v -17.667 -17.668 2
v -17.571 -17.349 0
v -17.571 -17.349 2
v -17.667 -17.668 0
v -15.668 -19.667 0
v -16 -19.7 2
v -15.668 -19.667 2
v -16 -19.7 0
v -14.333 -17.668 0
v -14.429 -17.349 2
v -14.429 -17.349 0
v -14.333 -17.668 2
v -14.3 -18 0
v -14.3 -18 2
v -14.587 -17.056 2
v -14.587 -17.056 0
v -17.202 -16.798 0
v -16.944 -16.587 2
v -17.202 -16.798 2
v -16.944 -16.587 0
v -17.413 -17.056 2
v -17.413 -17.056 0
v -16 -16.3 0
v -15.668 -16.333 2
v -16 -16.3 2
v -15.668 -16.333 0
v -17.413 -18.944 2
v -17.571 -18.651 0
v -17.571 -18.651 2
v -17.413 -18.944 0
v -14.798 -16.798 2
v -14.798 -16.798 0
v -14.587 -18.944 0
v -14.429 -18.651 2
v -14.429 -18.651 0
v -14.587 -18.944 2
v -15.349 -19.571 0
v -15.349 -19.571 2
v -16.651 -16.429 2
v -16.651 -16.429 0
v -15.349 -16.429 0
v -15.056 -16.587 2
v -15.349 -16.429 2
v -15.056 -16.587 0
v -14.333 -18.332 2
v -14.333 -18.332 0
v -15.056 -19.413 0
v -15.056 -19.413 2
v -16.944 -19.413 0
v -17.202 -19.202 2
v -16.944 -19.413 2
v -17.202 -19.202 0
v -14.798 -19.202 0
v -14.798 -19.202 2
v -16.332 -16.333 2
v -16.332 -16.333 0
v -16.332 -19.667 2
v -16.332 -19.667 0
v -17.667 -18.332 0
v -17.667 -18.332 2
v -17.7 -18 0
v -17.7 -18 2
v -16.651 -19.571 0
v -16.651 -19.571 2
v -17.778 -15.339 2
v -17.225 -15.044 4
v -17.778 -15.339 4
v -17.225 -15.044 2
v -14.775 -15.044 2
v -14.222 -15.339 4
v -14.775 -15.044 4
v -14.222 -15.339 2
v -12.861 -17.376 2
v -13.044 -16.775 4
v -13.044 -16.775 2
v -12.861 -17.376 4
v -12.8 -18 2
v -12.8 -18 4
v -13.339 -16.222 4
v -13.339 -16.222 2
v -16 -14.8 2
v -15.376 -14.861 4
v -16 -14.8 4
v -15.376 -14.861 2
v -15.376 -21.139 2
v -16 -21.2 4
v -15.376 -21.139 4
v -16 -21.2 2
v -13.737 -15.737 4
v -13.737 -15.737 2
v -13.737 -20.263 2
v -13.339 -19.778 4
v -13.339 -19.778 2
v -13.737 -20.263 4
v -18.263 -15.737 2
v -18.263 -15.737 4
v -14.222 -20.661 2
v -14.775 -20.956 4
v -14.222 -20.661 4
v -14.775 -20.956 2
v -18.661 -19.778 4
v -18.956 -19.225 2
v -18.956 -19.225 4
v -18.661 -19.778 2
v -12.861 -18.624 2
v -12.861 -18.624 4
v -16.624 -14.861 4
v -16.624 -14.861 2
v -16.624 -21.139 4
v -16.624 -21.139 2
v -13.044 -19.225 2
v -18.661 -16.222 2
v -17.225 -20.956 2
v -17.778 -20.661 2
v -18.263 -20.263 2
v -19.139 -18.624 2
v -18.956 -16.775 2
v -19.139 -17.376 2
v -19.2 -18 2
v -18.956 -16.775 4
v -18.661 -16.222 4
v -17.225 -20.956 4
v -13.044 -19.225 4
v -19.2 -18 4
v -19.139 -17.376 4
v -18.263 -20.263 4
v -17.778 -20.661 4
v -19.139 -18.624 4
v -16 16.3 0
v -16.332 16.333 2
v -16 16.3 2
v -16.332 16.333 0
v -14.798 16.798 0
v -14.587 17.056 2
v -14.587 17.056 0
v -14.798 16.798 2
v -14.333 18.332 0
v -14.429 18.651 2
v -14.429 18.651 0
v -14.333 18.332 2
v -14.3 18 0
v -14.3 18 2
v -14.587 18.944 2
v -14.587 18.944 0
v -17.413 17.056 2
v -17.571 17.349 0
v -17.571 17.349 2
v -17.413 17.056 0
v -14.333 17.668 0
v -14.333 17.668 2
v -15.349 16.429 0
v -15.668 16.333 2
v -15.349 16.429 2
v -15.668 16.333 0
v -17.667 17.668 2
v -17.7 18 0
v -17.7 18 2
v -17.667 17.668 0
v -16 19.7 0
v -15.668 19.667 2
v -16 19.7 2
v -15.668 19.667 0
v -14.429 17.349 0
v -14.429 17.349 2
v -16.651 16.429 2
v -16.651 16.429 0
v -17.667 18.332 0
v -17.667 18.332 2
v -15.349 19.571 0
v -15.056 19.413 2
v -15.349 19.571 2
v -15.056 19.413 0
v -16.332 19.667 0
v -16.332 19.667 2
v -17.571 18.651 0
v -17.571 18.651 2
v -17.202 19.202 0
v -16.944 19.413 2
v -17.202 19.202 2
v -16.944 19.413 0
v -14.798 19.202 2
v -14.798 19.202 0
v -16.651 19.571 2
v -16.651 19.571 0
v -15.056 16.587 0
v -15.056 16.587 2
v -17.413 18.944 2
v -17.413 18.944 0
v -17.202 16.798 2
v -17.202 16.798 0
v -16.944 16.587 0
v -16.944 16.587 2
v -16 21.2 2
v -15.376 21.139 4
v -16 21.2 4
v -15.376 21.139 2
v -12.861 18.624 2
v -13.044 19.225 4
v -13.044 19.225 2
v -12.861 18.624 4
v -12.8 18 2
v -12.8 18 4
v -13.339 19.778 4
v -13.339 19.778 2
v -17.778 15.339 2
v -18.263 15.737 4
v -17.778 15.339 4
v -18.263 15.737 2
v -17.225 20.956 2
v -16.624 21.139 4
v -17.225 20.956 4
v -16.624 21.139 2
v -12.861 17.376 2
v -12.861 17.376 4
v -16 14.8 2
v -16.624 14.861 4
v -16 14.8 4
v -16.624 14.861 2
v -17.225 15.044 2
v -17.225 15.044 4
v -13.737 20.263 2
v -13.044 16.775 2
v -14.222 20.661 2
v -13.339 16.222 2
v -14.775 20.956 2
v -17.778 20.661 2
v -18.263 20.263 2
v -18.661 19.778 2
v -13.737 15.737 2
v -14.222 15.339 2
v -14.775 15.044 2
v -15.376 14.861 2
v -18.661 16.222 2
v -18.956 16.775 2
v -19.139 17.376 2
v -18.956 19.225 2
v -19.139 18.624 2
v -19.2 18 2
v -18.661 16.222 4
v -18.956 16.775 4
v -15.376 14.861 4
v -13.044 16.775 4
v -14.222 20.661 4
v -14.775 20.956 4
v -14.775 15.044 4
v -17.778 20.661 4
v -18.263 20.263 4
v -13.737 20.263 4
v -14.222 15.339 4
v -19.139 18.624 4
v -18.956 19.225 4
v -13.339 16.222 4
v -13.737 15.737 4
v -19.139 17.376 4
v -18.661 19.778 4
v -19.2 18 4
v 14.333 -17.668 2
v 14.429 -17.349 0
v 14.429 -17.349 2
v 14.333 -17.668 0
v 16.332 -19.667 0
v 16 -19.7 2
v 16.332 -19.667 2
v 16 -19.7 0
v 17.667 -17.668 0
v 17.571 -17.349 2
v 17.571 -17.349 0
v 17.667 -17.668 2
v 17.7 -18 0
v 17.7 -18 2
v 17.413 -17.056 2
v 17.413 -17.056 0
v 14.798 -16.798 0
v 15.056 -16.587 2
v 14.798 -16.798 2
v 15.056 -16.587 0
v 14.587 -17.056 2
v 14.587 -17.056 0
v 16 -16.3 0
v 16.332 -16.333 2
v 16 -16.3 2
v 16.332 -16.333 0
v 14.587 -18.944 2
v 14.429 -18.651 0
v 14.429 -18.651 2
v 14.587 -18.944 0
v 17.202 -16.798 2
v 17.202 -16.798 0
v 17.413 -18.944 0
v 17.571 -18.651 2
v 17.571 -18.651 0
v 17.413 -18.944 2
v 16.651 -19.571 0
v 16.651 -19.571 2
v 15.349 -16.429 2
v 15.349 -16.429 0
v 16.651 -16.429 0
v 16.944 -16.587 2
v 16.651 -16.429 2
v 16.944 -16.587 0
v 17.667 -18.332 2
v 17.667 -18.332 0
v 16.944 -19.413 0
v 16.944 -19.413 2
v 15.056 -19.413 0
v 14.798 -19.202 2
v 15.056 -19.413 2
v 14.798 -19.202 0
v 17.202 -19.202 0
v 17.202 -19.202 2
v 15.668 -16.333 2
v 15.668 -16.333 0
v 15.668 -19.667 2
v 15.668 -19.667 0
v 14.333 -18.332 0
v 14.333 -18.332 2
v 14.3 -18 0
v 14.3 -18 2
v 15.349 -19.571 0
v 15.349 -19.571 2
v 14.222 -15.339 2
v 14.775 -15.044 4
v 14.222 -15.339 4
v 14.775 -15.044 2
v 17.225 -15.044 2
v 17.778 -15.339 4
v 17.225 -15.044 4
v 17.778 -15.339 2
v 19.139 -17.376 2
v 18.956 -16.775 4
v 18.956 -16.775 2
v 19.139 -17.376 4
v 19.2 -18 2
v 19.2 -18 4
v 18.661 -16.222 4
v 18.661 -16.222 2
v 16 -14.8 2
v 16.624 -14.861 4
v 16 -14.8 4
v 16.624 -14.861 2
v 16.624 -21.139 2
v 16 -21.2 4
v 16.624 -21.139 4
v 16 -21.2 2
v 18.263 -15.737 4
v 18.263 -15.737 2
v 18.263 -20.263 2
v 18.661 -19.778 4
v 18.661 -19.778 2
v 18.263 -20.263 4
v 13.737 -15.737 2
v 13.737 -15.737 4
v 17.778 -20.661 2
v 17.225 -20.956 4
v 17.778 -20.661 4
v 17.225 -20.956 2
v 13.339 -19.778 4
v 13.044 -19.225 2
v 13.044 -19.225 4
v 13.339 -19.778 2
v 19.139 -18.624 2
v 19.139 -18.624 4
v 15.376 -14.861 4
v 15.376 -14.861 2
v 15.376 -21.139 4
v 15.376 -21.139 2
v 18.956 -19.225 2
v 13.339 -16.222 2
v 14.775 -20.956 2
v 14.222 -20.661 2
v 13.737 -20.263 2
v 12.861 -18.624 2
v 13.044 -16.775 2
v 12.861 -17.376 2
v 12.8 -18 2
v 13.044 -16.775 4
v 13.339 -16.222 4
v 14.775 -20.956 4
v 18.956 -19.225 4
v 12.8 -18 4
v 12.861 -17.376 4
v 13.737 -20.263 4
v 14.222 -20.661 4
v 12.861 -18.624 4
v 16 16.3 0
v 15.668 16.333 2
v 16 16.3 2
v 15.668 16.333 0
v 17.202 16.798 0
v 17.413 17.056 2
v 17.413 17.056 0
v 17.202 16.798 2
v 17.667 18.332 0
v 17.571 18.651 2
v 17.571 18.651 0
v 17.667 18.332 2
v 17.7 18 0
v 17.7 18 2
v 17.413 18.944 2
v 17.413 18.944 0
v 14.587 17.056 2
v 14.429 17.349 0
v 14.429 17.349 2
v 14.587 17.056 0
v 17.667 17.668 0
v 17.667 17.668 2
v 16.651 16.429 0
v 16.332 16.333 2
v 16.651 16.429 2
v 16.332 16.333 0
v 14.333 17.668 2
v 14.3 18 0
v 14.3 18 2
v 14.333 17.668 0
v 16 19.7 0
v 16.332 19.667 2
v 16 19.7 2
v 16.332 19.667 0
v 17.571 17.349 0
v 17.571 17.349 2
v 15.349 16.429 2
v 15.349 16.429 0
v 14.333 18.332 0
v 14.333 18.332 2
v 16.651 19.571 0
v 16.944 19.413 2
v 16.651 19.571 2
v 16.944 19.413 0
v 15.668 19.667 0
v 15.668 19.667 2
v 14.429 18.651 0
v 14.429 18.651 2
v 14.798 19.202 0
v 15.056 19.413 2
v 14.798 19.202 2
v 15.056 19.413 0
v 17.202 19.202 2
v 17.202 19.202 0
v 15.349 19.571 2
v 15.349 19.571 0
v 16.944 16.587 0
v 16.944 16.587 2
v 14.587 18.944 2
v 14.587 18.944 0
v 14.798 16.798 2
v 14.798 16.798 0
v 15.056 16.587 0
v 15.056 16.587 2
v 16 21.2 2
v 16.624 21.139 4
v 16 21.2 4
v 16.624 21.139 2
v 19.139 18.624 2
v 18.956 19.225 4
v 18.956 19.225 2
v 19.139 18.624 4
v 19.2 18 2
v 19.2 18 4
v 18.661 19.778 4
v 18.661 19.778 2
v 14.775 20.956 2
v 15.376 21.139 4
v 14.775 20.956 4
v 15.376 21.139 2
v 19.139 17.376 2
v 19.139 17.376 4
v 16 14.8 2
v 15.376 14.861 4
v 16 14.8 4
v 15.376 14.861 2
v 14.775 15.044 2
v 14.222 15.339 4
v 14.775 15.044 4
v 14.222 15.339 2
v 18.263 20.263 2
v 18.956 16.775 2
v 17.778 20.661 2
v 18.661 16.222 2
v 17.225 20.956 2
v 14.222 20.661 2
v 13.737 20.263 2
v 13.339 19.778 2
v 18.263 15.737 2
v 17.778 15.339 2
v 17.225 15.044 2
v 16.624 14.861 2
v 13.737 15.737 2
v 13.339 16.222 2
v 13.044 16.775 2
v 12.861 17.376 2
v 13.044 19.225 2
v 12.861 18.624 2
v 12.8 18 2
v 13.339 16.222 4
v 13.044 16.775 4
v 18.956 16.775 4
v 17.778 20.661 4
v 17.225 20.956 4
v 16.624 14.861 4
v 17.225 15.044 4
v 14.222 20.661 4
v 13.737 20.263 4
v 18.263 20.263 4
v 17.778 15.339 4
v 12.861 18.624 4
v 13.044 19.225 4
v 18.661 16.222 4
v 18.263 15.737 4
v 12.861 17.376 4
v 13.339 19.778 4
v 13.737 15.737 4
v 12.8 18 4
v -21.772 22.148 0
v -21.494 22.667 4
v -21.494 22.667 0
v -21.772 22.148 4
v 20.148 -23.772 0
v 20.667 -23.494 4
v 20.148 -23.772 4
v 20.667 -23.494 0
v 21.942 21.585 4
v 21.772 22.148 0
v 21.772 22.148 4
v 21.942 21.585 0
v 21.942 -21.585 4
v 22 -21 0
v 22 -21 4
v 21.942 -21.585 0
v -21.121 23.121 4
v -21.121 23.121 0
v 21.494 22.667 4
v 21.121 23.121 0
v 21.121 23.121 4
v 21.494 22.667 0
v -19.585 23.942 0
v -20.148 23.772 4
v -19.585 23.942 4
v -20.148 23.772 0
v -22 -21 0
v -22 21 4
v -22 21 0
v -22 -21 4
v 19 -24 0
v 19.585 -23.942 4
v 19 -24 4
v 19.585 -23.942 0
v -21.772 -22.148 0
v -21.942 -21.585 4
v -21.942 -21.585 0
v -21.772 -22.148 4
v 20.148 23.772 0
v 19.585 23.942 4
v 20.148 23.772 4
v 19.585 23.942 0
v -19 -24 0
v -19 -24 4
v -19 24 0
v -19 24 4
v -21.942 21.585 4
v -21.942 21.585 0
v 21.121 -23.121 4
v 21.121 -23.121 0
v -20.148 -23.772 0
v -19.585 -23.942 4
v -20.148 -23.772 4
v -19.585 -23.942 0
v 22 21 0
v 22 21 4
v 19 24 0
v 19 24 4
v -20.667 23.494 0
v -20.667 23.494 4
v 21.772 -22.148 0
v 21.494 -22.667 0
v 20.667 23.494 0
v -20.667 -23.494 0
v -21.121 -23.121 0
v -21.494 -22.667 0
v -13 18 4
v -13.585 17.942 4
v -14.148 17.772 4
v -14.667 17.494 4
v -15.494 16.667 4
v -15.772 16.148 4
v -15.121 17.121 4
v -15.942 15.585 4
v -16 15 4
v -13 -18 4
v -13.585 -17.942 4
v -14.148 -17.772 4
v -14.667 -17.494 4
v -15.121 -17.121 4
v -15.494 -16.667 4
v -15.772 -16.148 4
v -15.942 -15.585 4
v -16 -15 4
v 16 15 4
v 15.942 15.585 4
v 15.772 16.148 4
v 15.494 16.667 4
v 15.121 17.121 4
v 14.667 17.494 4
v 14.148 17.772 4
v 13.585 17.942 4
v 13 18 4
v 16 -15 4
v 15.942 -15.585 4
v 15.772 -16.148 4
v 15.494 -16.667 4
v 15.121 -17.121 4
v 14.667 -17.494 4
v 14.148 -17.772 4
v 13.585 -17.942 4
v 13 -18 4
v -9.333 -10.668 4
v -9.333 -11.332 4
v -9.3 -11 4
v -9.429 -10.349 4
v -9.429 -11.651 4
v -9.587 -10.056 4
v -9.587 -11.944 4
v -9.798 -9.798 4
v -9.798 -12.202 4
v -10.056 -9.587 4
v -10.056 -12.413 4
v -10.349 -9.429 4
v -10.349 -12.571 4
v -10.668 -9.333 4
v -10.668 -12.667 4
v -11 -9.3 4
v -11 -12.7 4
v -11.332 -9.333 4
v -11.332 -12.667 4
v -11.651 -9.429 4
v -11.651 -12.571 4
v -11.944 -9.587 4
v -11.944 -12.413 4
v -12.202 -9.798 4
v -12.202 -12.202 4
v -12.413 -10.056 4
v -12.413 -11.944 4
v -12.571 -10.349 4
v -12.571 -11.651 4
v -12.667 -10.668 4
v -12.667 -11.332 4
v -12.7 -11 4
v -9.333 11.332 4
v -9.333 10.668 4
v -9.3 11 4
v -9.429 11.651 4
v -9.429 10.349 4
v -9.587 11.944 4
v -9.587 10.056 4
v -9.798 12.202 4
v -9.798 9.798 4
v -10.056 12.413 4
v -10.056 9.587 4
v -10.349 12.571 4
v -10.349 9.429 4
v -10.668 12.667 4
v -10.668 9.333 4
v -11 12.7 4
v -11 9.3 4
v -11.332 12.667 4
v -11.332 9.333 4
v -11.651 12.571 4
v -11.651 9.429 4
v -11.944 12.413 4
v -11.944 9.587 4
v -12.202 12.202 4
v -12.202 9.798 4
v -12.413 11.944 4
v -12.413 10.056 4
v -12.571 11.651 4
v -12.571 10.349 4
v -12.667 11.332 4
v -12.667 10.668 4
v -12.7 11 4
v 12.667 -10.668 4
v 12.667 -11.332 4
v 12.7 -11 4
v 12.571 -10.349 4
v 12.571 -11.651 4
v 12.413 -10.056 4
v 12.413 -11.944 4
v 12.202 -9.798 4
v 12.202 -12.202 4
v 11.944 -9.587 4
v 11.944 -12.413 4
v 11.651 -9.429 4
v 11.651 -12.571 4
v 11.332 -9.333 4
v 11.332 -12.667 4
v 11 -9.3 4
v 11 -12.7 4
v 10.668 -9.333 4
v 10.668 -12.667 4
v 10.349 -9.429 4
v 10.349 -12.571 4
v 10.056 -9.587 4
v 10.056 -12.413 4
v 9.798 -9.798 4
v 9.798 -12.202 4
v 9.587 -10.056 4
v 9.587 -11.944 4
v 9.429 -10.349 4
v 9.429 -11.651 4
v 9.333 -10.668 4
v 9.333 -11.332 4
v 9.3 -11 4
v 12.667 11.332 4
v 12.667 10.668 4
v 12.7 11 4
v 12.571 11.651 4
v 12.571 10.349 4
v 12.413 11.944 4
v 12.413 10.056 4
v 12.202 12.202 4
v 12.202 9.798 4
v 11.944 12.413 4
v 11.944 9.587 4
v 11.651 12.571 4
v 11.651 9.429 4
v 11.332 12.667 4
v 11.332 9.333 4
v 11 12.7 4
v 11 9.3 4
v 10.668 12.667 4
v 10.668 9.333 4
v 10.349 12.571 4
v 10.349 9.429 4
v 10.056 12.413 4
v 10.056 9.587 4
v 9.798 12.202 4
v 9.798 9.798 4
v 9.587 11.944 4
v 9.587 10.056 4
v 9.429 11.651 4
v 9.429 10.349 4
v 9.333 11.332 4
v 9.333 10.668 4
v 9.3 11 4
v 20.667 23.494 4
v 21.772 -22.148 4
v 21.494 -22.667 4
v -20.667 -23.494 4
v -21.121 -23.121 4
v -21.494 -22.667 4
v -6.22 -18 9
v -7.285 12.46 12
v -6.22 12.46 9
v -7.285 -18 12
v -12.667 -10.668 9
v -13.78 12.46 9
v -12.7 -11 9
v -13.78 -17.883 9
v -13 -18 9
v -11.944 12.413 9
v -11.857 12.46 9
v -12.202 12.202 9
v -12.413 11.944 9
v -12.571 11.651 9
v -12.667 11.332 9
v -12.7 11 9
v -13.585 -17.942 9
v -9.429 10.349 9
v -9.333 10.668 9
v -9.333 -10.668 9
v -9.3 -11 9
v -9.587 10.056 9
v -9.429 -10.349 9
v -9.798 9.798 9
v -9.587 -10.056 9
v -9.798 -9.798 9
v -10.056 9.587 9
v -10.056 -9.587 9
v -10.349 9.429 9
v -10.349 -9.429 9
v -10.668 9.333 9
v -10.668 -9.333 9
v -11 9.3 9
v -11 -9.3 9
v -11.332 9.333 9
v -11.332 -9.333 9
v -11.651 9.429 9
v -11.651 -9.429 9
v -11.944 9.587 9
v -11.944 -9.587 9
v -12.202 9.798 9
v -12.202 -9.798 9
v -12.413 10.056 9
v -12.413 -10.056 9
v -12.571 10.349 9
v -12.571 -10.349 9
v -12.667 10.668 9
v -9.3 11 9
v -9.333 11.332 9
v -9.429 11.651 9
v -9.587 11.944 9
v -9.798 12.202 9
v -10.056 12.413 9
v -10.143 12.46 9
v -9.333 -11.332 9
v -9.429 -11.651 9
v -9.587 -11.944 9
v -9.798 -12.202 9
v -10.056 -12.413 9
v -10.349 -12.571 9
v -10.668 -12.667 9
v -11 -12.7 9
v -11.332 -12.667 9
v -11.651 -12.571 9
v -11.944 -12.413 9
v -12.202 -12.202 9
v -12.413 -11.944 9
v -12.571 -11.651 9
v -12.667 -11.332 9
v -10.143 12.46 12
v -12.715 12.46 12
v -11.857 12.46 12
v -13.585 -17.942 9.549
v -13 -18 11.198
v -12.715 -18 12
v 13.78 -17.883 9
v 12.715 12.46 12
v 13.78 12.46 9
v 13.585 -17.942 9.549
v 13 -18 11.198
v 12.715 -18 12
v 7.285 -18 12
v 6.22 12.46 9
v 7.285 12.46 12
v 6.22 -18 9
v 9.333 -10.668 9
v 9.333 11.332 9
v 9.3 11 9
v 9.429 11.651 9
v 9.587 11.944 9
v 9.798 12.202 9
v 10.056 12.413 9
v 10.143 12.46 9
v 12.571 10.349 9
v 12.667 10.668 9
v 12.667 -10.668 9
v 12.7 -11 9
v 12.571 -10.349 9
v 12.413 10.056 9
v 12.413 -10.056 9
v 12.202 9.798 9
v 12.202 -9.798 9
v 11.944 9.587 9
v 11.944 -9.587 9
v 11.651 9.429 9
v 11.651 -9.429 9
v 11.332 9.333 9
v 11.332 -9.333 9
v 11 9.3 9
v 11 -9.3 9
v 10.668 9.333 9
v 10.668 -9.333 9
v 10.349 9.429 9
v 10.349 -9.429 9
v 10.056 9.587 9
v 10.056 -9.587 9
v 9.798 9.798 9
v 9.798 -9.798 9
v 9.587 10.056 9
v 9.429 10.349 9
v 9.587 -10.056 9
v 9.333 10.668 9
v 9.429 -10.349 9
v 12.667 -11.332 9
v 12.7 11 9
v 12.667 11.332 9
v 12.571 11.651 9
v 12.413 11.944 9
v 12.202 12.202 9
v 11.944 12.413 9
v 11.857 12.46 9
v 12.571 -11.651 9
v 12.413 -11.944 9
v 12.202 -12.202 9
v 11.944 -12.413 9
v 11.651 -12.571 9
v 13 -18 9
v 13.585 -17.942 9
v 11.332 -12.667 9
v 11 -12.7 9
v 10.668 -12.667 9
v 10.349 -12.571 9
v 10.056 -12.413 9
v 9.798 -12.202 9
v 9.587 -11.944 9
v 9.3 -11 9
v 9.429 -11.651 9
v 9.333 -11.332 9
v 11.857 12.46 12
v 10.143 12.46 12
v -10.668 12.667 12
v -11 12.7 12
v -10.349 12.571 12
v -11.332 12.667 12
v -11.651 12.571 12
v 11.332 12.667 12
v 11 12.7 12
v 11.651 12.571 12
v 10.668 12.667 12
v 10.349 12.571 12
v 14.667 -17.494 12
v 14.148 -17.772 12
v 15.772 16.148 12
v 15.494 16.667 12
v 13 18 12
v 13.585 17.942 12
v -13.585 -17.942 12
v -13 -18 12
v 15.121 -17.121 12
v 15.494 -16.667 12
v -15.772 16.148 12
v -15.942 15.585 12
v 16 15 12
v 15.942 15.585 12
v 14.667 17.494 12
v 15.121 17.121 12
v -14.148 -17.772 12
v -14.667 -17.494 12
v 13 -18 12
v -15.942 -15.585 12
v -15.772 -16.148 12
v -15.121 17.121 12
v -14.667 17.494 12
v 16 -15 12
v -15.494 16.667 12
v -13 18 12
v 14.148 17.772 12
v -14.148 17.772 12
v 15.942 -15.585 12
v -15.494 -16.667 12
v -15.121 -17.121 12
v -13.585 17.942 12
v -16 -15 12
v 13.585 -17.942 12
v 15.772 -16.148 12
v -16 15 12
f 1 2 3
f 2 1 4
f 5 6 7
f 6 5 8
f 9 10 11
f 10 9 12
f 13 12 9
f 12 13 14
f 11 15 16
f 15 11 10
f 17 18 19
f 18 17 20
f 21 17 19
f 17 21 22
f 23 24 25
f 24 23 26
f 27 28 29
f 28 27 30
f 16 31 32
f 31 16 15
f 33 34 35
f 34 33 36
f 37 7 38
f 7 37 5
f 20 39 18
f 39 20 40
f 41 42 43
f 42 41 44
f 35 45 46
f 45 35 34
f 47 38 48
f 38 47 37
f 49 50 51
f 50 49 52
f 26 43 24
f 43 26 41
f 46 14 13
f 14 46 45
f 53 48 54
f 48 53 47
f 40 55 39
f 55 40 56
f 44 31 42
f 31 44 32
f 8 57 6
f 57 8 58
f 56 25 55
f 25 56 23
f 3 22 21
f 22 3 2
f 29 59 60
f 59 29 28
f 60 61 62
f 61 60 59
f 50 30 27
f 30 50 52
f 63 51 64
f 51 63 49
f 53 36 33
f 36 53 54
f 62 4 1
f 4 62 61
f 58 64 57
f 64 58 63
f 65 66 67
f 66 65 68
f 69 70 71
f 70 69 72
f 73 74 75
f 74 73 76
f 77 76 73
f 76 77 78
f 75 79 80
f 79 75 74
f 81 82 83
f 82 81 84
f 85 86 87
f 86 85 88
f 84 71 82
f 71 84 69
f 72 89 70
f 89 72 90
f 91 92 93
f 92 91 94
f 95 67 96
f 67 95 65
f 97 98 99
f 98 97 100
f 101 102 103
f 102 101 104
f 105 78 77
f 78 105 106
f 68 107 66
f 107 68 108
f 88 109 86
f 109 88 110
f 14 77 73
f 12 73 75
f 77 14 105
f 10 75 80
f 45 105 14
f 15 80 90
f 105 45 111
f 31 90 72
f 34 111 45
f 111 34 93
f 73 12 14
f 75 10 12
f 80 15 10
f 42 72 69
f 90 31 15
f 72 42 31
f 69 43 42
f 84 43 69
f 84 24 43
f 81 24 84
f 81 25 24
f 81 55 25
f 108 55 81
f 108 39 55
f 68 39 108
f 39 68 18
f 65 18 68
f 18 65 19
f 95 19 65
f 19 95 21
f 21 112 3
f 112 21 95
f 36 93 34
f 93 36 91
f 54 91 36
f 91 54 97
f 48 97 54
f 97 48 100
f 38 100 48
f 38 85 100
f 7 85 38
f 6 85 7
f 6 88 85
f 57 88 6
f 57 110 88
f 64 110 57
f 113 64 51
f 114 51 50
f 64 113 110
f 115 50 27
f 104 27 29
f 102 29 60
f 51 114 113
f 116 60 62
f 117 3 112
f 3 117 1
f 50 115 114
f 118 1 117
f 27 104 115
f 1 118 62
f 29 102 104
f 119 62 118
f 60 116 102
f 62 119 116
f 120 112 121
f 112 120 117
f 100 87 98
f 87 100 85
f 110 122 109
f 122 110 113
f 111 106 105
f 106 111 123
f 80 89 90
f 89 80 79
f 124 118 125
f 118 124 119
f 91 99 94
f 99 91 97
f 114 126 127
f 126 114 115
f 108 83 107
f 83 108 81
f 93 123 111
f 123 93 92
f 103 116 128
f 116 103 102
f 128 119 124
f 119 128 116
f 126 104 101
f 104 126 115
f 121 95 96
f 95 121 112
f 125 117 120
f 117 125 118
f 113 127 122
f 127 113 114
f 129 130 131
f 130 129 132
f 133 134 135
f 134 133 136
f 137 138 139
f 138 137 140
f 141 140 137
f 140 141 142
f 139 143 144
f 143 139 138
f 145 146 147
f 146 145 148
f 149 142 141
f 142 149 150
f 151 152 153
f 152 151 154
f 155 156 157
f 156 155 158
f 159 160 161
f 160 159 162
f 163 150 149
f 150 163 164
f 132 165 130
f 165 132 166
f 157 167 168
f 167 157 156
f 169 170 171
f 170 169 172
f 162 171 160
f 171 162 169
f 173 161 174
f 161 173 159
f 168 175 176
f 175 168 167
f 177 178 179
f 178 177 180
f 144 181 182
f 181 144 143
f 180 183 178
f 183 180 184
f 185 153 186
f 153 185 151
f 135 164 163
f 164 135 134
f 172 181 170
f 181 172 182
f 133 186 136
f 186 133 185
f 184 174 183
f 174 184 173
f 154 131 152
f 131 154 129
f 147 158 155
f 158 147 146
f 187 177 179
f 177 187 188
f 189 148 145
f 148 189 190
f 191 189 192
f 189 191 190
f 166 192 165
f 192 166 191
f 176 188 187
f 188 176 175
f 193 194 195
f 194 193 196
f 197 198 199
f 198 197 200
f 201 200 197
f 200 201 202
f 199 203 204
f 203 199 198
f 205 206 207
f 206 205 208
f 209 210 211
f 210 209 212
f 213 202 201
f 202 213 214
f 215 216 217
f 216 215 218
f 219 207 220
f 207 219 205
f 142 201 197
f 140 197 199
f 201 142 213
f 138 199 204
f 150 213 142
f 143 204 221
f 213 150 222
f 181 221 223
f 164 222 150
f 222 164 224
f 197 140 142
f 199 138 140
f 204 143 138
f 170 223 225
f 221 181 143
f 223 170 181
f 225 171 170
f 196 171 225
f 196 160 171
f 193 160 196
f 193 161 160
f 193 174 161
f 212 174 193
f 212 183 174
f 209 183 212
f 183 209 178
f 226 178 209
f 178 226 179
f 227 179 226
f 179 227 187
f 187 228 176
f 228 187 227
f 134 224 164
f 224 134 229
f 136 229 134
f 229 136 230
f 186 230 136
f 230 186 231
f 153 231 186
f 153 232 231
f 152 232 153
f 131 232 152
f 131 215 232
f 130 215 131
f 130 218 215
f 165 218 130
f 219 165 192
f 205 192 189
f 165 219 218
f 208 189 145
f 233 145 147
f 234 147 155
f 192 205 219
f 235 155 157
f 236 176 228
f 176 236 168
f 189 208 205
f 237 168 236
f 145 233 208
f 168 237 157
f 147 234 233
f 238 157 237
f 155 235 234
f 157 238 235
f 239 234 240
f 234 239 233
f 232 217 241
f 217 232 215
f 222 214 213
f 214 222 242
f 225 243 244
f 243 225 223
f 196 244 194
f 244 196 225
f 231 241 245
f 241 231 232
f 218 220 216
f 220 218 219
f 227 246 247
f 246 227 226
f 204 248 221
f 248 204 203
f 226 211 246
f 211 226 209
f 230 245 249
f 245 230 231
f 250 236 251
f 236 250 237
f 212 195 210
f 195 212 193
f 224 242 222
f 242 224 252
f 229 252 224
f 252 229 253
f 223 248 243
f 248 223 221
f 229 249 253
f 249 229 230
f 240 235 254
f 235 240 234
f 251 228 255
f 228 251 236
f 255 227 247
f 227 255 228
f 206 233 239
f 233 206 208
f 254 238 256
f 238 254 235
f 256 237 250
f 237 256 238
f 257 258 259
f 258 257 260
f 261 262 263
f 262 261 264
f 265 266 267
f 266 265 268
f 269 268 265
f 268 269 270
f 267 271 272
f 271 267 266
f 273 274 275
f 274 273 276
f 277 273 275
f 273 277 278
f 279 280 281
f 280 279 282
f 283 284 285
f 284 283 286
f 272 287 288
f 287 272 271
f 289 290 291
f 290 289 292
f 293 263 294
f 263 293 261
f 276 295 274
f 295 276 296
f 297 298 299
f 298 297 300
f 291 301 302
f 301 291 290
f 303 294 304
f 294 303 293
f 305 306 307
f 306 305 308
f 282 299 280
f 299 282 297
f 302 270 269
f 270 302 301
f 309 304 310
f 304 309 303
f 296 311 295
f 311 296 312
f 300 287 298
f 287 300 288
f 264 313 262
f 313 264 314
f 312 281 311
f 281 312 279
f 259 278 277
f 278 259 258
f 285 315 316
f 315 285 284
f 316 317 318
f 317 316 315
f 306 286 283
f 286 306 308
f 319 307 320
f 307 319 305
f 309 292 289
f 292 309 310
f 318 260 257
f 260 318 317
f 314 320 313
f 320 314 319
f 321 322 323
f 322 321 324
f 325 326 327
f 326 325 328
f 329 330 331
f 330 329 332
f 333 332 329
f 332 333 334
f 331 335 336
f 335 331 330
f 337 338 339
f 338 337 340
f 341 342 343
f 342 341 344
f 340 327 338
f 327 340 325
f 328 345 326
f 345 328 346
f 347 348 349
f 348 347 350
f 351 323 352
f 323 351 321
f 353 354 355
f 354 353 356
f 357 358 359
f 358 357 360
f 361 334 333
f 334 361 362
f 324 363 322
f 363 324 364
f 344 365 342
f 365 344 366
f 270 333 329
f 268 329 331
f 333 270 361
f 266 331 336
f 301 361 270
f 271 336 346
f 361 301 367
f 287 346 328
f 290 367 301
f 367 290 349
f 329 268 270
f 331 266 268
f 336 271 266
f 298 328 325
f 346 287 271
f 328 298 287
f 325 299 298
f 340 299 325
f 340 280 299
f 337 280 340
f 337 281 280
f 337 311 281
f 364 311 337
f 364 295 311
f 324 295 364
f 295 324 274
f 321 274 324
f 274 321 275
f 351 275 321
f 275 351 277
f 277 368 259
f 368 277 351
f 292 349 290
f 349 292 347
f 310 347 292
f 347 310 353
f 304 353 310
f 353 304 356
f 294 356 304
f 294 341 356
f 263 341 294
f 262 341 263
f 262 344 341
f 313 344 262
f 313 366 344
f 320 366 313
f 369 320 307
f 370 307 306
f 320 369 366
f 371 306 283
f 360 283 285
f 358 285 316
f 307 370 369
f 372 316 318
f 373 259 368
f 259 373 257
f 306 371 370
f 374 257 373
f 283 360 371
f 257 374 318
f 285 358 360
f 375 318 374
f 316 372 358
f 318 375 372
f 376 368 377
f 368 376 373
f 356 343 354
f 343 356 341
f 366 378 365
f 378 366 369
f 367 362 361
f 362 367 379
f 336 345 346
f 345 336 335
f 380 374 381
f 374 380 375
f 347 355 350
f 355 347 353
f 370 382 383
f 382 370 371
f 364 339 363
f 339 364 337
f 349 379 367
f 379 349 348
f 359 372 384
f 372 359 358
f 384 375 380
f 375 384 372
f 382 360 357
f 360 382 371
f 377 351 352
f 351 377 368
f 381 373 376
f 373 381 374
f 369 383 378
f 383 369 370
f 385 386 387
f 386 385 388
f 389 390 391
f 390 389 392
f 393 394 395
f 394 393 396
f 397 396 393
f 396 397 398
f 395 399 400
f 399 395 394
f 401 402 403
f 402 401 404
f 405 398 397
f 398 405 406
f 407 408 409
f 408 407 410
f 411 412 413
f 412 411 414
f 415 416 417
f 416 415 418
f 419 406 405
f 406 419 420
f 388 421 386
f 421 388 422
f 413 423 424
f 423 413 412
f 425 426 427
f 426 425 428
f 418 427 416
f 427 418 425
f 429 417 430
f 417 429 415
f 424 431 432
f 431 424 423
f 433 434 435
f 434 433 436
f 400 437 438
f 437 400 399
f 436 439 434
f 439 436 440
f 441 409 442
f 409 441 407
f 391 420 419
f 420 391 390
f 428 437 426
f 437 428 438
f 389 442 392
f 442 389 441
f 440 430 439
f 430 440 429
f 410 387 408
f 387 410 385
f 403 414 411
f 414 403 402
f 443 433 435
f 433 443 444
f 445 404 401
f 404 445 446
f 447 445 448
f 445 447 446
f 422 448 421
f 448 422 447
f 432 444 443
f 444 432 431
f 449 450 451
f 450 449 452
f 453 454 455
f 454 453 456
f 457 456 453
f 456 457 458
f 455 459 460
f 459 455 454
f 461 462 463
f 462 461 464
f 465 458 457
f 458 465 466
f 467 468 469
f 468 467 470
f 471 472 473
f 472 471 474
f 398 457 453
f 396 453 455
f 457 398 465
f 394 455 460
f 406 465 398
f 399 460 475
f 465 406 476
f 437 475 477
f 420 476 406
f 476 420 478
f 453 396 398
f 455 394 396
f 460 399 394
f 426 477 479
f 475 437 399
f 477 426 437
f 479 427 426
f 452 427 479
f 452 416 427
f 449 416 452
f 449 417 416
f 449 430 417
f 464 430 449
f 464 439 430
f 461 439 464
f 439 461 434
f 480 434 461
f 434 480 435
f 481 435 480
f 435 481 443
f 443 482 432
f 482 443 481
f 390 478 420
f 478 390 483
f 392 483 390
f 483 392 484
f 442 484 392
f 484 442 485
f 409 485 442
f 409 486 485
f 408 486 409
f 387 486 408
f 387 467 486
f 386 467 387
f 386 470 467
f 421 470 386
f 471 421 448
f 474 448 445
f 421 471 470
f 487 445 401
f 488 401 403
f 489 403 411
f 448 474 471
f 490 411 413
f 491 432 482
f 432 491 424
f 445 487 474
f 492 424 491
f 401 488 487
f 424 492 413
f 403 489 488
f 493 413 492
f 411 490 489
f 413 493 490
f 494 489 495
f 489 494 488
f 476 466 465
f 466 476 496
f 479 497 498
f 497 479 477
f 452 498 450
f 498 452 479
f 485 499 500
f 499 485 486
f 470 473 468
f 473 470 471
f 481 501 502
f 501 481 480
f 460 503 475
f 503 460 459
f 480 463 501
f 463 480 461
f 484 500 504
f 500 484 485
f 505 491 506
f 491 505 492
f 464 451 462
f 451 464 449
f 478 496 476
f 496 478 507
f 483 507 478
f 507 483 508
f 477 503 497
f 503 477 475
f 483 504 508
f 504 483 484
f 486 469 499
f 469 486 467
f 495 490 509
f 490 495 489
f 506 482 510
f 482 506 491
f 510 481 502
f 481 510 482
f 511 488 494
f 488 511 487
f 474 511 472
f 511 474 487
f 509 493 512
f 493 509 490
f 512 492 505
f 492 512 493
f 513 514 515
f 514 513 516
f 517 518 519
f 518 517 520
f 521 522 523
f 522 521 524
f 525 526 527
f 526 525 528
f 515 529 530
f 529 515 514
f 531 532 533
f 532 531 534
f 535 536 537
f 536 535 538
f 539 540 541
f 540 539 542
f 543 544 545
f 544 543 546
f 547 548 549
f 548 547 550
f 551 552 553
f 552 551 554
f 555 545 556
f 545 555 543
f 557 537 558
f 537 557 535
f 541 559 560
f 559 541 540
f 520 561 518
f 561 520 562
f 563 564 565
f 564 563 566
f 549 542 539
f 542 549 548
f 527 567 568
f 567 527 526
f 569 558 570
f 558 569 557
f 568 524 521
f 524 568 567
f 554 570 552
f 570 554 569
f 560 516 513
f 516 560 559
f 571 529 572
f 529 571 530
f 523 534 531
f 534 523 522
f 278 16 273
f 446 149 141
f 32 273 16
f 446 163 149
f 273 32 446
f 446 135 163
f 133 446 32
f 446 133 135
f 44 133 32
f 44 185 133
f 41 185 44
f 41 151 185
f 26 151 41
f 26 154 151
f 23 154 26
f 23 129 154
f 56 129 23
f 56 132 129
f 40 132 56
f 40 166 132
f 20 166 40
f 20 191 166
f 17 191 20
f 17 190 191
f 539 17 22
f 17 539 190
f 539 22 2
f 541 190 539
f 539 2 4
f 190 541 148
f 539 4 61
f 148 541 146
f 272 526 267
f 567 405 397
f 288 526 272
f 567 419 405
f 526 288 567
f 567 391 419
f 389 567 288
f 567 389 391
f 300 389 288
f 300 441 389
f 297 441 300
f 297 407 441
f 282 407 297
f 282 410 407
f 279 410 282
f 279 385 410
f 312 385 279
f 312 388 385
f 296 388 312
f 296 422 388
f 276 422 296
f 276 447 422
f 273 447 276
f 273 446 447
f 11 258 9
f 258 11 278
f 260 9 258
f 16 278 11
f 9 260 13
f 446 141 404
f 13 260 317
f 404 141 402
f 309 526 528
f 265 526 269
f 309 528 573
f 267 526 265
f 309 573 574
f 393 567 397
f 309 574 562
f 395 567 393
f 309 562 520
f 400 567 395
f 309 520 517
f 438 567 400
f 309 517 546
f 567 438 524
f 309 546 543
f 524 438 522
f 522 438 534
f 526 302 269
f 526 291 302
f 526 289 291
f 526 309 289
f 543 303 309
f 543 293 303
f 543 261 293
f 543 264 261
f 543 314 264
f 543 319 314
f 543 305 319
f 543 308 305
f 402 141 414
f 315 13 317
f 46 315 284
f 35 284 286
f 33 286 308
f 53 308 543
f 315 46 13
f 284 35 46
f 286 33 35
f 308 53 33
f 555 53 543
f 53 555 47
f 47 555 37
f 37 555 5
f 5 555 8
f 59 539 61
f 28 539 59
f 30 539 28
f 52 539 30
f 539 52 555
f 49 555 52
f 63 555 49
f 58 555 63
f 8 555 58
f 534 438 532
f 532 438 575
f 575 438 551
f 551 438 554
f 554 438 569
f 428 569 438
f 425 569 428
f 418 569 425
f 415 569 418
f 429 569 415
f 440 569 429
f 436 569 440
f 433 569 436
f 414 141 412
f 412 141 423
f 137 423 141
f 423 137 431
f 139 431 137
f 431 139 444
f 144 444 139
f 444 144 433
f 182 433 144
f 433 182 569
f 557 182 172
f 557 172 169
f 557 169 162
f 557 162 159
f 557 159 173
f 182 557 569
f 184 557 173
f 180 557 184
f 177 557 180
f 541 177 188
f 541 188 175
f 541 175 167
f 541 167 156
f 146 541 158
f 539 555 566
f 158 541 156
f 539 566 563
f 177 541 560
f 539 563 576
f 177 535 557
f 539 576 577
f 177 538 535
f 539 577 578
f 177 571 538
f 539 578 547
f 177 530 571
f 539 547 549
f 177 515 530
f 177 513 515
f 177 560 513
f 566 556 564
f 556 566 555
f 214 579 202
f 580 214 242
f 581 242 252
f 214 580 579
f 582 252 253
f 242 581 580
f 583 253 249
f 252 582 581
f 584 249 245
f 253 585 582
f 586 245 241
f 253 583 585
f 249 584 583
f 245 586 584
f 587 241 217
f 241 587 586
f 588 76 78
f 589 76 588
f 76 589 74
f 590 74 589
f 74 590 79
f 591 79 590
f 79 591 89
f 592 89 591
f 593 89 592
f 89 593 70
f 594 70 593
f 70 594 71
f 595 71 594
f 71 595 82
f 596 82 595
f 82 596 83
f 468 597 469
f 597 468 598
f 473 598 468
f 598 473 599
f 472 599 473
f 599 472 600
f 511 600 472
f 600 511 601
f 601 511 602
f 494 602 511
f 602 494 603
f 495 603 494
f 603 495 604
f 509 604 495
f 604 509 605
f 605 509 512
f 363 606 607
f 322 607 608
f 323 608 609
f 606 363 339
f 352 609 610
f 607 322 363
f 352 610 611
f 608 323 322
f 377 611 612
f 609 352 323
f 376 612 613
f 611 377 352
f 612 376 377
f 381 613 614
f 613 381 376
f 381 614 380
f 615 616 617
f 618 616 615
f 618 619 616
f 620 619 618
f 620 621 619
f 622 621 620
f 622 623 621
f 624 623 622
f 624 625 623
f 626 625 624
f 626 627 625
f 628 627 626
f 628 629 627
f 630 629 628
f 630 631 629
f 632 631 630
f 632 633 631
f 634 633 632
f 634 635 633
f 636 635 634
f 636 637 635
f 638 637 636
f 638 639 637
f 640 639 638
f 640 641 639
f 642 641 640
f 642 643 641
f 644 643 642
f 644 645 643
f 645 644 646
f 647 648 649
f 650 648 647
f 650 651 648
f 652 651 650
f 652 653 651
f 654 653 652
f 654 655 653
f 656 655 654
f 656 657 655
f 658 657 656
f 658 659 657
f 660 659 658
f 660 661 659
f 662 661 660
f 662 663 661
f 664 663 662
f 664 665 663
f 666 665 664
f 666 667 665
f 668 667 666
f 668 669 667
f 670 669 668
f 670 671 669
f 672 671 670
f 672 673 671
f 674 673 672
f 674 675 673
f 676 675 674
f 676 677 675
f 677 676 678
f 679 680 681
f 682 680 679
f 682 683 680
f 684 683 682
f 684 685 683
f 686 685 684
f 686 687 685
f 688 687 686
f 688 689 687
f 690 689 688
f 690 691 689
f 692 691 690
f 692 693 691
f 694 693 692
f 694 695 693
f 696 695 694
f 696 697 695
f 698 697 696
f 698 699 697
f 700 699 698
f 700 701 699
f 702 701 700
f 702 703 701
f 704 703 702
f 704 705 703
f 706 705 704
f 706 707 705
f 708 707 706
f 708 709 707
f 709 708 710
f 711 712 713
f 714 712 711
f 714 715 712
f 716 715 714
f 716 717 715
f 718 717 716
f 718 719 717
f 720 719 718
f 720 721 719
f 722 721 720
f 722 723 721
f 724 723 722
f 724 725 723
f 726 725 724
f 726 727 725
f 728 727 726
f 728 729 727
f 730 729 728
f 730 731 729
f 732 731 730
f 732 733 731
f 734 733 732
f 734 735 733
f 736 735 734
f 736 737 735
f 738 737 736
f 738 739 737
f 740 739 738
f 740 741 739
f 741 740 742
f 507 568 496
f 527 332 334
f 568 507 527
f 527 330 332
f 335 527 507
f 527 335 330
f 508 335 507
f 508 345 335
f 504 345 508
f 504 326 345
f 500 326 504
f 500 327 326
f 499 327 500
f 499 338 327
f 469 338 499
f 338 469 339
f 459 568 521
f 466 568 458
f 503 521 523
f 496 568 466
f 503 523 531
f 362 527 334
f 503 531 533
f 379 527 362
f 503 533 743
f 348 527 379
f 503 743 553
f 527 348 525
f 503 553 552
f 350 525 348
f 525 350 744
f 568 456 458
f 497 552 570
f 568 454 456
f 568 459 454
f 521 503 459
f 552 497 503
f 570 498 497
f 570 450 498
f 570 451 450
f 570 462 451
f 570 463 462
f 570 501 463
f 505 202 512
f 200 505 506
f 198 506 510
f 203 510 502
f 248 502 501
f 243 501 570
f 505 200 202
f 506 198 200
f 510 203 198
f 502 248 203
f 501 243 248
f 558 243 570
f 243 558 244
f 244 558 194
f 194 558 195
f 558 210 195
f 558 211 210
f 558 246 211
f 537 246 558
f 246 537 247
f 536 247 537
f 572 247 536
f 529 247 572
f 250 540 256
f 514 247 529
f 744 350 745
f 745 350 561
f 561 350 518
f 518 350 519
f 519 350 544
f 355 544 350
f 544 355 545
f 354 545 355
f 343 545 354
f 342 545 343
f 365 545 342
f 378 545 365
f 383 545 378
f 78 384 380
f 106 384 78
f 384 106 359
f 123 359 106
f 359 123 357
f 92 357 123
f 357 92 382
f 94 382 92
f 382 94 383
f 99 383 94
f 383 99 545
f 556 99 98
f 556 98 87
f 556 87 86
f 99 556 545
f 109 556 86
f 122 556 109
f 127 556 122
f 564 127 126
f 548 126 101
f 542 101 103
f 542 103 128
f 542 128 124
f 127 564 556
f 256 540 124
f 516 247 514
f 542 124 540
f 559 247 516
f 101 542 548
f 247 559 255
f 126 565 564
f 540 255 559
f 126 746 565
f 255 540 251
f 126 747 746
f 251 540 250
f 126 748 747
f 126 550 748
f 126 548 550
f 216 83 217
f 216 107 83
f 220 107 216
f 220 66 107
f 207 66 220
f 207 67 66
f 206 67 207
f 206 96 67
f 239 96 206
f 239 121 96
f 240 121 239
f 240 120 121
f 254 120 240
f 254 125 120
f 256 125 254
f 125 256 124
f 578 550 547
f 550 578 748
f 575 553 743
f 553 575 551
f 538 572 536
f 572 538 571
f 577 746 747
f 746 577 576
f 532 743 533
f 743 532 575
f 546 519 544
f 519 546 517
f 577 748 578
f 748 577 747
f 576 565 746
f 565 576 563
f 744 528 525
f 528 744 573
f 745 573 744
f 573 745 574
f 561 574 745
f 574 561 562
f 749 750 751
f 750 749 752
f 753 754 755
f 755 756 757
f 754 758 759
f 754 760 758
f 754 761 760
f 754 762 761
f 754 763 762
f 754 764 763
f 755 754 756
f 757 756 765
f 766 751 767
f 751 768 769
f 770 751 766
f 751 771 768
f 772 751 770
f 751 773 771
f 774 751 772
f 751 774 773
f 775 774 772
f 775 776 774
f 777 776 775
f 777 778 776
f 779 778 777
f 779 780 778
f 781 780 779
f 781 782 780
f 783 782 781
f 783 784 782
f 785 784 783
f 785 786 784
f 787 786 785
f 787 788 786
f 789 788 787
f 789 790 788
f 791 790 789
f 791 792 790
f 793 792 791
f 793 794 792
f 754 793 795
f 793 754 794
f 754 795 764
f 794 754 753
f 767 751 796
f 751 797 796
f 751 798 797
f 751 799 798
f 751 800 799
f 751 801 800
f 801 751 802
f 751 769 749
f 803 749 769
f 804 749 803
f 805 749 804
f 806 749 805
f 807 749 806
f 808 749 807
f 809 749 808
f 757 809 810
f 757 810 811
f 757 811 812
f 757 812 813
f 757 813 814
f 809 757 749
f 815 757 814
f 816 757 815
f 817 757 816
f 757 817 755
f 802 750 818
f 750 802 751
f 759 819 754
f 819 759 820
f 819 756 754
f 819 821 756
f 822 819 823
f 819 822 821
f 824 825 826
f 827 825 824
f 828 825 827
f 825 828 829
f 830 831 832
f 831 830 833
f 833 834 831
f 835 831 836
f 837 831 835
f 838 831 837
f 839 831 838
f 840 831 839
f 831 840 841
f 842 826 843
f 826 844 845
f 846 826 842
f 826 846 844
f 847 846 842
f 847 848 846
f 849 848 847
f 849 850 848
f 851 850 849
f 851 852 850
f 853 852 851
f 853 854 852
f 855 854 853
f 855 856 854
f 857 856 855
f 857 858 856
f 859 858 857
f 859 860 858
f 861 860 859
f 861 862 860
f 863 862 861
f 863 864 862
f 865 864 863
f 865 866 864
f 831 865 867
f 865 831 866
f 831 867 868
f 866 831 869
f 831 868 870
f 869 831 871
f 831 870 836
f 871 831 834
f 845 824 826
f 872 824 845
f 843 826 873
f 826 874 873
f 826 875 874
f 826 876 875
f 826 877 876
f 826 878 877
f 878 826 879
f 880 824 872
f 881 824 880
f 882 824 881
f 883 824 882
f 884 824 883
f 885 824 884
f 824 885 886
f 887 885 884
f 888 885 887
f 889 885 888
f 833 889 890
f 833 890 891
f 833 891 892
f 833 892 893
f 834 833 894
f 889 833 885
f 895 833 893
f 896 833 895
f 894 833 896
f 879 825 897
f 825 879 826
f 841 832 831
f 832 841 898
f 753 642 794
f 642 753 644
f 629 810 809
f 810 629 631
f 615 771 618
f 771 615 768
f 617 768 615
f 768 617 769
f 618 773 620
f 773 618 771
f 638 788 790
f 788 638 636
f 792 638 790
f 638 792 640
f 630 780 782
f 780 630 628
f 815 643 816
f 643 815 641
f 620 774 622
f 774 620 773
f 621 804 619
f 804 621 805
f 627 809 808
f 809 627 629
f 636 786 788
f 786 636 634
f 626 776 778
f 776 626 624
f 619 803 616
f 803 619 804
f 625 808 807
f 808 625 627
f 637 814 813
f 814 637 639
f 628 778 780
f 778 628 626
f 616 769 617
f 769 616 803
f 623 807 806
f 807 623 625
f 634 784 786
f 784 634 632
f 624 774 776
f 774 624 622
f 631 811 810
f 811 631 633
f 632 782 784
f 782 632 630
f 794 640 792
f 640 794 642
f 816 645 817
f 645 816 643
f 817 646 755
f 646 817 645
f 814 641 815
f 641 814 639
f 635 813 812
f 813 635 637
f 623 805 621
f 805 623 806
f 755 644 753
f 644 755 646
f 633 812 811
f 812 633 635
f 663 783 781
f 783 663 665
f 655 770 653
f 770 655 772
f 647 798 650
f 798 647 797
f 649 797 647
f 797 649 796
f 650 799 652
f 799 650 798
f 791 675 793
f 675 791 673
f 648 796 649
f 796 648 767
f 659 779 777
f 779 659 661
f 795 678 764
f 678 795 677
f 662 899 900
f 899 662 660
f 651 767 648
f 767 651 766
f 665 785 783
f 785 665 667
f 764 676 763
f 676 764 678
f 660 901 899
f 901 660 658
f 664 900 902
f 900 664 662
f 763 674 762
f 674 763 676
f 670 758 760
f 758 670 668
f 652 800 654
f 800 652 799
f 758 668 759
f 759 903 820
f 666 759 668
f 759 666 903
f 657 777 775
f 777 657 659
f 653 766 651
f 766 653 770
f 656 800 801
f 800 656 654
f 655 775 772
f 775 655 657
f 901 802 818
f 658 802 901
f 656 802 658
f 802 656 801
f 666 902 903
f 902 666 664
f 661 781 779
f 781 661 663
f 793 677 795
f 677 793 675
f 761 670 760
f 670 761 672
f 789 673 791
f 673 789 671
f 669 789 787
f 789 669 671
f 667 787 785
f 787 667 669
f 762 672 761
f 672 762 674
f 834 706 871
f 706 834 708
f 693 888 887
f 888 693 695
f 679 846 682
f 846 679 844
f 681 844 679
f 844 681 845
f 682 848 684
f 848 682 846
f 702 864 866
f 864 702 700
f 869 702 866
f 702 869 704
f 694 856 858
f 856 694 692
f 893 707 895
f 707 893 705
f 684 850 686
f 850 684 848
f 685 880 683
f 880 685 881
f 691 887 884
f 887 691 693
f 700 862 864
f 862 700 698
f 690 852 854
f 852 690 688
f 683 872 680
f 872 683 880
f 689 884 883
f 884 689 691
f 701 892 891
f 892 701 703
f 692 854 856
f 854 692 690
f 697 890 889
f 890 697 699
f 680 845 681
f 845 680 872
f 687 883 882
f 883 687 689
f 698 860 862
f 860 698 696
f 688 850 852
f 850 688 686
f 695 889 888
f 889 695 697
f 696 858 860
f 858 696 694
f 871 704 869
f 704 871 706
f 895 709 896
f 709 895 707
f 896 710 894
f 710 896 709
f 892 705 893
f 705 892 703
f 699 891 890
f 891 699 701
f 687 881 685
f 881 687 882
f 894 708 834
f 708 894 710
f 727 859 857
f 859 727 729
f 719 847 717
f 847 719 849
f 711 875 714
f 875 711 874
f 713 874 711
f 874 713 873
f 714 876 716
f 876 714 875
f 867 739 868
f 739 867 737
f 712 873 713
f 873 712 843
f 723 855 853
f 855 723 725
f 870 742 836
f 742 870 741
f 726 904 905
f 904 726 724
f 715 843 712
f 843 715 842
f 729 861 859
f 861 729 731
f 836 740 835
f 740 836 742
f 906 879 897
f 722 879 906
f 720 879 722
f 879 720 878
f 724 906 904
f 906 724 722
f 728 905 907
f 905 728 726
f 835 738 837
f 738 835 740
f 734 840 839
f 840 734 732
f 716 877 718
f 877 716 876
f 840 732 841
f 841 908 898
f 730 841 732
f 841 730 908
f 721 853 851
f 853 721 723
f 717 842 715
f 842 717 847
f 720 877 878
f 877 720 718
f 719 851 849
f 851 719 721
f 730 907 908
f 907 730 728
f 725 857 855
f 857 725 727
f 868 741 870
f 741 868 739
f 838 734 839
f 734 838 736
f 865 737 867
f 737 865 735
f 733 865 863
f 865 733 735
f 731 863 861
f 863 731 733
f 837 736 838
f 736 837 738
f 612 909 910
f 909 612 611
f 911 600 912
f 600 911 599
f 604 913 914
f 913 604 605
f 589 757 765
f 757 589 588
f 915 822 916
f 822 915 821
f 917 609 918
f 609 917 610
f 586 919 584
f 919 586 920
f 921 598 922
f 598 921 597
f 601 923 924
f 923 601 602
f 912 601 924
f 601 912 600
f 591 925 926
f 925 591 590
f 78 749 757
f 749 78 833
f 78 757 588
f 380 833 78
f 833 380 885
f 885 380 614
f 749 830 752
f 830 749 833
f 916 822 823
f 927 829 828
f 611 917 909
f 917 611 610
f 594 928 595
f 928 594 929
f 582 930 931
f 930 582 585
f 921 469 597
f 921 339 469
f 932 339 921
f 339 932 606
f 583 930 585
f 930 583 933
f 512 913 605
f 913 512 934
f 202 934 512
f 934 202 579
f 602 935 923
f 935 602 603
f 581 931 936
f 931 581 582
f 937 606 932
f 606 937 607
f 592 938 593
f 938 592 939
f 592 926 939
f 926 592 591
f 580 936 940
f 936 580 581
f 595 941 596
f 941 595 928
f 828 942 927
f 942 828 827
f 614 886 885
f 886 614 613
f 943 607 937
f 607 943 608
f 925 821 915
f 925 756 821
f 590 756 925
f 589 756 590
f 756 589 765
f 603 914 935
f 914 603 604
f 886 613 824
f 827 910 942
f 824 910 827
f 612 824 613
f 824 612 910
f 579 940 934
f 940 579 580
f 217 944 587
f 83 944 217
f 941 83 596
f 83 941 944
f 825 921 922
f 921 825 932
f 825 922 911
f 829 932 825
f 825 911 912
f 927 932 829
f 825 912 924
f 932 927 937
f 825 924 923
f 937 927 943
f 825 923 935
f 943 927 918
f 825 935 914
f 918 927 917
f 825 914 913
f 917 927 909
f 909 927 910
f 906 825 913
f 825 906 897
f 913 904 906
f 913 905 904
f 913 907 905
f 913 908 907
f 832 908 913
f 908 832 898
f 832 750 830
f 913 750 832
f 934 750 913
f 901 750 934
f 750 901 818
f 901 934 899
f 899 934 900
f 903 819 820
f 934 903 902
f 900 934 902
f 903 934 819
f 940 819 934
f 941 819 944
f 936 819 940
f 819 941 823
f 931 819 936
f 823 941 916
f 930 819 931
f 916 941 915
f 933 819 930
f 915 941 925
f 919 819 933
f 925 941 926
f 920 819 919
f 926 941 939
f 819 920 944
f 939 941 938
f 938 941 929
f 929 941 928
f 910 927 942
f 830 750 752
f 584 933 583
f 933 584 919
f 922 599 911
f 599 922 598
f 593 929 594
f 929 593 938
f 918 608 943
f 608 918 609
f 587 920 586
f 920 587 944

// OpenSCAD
// file: rm_common.scad
// RobotMind Rev A: one slide-in interface for every payload carrier.
// Dimensions are mm; tune clearance on a short fit coupon before full prints.
$fn = 32;

RM_EPS = 0.1;
RM_CLEARANCE = 0.28;
RM_M3_CLEARANCE = 3.4;

RM_DOCK_W = 32;
RM_DOCK_L = 36;
RM_DOCK_H = 8;
RM_RAIL_X = 10;
RM_RAIL_ROOT = 4.8;
RM_RAIL_HEAD = 7.0;
RM_RAIL_H = 3.0;
RM_RAIL_L = 30;

assert(RM_RAIL_HEAD > RM_RAIL_ROOT, "Rail must retain the carrier");
assert(RM_DOCK_H > RM_RAIL_H, "Dock needs material below the rail");
assert(RM_RAIL_L + 2*RM_CLEARANCE < RM_DOCK_L,
       "Rail needs an open insertion end and rear stop");

module rounded_box(size=[20,20,3], r=2) {
  linear_extrude(height=size[2])
    offset(r=r) offset(delta=-r) square([size[0],size[1]]);
}

// The profile is narrow at the carrier root and wider at its free end.
module rail_profile(root=RM_RAIL_ROOT, head=RM_RAIL_HEAD, h=RM_RAIL_H) {
  polygon(points=[[-root/2,0], [root/2,0], [head/2,h], [-head/2,h]]);
}

// Runs along +Y and projects below Z=0. Carriers place this at their underside.
module male_rail(length=RM_RAIL_L) {
  translate([0,-length/2,0]) rotate([-90,0,0])
    linear_extrude(height=length) rail_profile();
}

module male_interface() {
  for(x=[-RM_RAIL_X,RM_RAIL_X])
    translate([x,0,0]) male_rail();
}

// Matching void, open at the front (-Y); material at +Y is the hard stop.
module rail_channel(length=RM_RAIL_L+2*RM_CLEARANCE) {
  translate([0,-RM_DOCK_L/2-RM_EPS,RM_DOCK_H+RM_EPS]) rotate([-90,0,0])
    linear_extrude(height=length)
      rail_profile(RM_RAIL_ROOT+2*RM_CLEARANCE,
                   RM_RAIL_HEAD+2*RM_CLEARANCE,
                   RM_RAIL_H+RM_EPS);
}

module universal_dock() {
  difference() {
    translate([-RM_DOCK_W/2,-RM_DOCK_L/2,0])
      rounded_box([RM_DOCK_W,RM_DOCK_L,RM_DOCK_H],3);
    for(x=[-RM_RAIL_X,RM_RAIL_X]) translate([x,0,0]) rail_channel();
    for(x=[-11,11], y=[-11,11])
      translate([x,y,-RM_EPS]) cylinder(h=RM_DOCK_H+2*RM_EPS,d=RM_M3_CLEARANCE);
  }
}

// Place a carrier's Z=0 plane at the dock surface; its rails fill the recess.
function docked_carrier_z() = RM_DOCK_H;
// Centre position after the rail reaches the rear stop.
function docked_carrier_y() = -RM_DOCK_L/2 - RM_EPS +
                              RM_RAIL_L/2 + 2*RM_CLEARANCE;
// main file
include <rm_common.scad>

// Plain M3 mounting plate: use it for a robot, wall, or tripod adapter base.
PLATE = [44,48,4];
difference() {
  translate([-PLATE[0]/2,-PLATE[1]/2,0]) rounded_box(PLATE,3);
  for(x=[-16,16], y=[-18,18]) {
    translate([x,y,-RM_EPS]) cylinder(h=PLATE[2]+2*RM_EPS,d=RM_M3_CLEARANCE);
    translate([x,y,PLATE[2]-2]) cylinder(h=2+RM_EPS,d=6.4);
  }
}
translate([0,0,PLATE[2]]) universal_dock();
